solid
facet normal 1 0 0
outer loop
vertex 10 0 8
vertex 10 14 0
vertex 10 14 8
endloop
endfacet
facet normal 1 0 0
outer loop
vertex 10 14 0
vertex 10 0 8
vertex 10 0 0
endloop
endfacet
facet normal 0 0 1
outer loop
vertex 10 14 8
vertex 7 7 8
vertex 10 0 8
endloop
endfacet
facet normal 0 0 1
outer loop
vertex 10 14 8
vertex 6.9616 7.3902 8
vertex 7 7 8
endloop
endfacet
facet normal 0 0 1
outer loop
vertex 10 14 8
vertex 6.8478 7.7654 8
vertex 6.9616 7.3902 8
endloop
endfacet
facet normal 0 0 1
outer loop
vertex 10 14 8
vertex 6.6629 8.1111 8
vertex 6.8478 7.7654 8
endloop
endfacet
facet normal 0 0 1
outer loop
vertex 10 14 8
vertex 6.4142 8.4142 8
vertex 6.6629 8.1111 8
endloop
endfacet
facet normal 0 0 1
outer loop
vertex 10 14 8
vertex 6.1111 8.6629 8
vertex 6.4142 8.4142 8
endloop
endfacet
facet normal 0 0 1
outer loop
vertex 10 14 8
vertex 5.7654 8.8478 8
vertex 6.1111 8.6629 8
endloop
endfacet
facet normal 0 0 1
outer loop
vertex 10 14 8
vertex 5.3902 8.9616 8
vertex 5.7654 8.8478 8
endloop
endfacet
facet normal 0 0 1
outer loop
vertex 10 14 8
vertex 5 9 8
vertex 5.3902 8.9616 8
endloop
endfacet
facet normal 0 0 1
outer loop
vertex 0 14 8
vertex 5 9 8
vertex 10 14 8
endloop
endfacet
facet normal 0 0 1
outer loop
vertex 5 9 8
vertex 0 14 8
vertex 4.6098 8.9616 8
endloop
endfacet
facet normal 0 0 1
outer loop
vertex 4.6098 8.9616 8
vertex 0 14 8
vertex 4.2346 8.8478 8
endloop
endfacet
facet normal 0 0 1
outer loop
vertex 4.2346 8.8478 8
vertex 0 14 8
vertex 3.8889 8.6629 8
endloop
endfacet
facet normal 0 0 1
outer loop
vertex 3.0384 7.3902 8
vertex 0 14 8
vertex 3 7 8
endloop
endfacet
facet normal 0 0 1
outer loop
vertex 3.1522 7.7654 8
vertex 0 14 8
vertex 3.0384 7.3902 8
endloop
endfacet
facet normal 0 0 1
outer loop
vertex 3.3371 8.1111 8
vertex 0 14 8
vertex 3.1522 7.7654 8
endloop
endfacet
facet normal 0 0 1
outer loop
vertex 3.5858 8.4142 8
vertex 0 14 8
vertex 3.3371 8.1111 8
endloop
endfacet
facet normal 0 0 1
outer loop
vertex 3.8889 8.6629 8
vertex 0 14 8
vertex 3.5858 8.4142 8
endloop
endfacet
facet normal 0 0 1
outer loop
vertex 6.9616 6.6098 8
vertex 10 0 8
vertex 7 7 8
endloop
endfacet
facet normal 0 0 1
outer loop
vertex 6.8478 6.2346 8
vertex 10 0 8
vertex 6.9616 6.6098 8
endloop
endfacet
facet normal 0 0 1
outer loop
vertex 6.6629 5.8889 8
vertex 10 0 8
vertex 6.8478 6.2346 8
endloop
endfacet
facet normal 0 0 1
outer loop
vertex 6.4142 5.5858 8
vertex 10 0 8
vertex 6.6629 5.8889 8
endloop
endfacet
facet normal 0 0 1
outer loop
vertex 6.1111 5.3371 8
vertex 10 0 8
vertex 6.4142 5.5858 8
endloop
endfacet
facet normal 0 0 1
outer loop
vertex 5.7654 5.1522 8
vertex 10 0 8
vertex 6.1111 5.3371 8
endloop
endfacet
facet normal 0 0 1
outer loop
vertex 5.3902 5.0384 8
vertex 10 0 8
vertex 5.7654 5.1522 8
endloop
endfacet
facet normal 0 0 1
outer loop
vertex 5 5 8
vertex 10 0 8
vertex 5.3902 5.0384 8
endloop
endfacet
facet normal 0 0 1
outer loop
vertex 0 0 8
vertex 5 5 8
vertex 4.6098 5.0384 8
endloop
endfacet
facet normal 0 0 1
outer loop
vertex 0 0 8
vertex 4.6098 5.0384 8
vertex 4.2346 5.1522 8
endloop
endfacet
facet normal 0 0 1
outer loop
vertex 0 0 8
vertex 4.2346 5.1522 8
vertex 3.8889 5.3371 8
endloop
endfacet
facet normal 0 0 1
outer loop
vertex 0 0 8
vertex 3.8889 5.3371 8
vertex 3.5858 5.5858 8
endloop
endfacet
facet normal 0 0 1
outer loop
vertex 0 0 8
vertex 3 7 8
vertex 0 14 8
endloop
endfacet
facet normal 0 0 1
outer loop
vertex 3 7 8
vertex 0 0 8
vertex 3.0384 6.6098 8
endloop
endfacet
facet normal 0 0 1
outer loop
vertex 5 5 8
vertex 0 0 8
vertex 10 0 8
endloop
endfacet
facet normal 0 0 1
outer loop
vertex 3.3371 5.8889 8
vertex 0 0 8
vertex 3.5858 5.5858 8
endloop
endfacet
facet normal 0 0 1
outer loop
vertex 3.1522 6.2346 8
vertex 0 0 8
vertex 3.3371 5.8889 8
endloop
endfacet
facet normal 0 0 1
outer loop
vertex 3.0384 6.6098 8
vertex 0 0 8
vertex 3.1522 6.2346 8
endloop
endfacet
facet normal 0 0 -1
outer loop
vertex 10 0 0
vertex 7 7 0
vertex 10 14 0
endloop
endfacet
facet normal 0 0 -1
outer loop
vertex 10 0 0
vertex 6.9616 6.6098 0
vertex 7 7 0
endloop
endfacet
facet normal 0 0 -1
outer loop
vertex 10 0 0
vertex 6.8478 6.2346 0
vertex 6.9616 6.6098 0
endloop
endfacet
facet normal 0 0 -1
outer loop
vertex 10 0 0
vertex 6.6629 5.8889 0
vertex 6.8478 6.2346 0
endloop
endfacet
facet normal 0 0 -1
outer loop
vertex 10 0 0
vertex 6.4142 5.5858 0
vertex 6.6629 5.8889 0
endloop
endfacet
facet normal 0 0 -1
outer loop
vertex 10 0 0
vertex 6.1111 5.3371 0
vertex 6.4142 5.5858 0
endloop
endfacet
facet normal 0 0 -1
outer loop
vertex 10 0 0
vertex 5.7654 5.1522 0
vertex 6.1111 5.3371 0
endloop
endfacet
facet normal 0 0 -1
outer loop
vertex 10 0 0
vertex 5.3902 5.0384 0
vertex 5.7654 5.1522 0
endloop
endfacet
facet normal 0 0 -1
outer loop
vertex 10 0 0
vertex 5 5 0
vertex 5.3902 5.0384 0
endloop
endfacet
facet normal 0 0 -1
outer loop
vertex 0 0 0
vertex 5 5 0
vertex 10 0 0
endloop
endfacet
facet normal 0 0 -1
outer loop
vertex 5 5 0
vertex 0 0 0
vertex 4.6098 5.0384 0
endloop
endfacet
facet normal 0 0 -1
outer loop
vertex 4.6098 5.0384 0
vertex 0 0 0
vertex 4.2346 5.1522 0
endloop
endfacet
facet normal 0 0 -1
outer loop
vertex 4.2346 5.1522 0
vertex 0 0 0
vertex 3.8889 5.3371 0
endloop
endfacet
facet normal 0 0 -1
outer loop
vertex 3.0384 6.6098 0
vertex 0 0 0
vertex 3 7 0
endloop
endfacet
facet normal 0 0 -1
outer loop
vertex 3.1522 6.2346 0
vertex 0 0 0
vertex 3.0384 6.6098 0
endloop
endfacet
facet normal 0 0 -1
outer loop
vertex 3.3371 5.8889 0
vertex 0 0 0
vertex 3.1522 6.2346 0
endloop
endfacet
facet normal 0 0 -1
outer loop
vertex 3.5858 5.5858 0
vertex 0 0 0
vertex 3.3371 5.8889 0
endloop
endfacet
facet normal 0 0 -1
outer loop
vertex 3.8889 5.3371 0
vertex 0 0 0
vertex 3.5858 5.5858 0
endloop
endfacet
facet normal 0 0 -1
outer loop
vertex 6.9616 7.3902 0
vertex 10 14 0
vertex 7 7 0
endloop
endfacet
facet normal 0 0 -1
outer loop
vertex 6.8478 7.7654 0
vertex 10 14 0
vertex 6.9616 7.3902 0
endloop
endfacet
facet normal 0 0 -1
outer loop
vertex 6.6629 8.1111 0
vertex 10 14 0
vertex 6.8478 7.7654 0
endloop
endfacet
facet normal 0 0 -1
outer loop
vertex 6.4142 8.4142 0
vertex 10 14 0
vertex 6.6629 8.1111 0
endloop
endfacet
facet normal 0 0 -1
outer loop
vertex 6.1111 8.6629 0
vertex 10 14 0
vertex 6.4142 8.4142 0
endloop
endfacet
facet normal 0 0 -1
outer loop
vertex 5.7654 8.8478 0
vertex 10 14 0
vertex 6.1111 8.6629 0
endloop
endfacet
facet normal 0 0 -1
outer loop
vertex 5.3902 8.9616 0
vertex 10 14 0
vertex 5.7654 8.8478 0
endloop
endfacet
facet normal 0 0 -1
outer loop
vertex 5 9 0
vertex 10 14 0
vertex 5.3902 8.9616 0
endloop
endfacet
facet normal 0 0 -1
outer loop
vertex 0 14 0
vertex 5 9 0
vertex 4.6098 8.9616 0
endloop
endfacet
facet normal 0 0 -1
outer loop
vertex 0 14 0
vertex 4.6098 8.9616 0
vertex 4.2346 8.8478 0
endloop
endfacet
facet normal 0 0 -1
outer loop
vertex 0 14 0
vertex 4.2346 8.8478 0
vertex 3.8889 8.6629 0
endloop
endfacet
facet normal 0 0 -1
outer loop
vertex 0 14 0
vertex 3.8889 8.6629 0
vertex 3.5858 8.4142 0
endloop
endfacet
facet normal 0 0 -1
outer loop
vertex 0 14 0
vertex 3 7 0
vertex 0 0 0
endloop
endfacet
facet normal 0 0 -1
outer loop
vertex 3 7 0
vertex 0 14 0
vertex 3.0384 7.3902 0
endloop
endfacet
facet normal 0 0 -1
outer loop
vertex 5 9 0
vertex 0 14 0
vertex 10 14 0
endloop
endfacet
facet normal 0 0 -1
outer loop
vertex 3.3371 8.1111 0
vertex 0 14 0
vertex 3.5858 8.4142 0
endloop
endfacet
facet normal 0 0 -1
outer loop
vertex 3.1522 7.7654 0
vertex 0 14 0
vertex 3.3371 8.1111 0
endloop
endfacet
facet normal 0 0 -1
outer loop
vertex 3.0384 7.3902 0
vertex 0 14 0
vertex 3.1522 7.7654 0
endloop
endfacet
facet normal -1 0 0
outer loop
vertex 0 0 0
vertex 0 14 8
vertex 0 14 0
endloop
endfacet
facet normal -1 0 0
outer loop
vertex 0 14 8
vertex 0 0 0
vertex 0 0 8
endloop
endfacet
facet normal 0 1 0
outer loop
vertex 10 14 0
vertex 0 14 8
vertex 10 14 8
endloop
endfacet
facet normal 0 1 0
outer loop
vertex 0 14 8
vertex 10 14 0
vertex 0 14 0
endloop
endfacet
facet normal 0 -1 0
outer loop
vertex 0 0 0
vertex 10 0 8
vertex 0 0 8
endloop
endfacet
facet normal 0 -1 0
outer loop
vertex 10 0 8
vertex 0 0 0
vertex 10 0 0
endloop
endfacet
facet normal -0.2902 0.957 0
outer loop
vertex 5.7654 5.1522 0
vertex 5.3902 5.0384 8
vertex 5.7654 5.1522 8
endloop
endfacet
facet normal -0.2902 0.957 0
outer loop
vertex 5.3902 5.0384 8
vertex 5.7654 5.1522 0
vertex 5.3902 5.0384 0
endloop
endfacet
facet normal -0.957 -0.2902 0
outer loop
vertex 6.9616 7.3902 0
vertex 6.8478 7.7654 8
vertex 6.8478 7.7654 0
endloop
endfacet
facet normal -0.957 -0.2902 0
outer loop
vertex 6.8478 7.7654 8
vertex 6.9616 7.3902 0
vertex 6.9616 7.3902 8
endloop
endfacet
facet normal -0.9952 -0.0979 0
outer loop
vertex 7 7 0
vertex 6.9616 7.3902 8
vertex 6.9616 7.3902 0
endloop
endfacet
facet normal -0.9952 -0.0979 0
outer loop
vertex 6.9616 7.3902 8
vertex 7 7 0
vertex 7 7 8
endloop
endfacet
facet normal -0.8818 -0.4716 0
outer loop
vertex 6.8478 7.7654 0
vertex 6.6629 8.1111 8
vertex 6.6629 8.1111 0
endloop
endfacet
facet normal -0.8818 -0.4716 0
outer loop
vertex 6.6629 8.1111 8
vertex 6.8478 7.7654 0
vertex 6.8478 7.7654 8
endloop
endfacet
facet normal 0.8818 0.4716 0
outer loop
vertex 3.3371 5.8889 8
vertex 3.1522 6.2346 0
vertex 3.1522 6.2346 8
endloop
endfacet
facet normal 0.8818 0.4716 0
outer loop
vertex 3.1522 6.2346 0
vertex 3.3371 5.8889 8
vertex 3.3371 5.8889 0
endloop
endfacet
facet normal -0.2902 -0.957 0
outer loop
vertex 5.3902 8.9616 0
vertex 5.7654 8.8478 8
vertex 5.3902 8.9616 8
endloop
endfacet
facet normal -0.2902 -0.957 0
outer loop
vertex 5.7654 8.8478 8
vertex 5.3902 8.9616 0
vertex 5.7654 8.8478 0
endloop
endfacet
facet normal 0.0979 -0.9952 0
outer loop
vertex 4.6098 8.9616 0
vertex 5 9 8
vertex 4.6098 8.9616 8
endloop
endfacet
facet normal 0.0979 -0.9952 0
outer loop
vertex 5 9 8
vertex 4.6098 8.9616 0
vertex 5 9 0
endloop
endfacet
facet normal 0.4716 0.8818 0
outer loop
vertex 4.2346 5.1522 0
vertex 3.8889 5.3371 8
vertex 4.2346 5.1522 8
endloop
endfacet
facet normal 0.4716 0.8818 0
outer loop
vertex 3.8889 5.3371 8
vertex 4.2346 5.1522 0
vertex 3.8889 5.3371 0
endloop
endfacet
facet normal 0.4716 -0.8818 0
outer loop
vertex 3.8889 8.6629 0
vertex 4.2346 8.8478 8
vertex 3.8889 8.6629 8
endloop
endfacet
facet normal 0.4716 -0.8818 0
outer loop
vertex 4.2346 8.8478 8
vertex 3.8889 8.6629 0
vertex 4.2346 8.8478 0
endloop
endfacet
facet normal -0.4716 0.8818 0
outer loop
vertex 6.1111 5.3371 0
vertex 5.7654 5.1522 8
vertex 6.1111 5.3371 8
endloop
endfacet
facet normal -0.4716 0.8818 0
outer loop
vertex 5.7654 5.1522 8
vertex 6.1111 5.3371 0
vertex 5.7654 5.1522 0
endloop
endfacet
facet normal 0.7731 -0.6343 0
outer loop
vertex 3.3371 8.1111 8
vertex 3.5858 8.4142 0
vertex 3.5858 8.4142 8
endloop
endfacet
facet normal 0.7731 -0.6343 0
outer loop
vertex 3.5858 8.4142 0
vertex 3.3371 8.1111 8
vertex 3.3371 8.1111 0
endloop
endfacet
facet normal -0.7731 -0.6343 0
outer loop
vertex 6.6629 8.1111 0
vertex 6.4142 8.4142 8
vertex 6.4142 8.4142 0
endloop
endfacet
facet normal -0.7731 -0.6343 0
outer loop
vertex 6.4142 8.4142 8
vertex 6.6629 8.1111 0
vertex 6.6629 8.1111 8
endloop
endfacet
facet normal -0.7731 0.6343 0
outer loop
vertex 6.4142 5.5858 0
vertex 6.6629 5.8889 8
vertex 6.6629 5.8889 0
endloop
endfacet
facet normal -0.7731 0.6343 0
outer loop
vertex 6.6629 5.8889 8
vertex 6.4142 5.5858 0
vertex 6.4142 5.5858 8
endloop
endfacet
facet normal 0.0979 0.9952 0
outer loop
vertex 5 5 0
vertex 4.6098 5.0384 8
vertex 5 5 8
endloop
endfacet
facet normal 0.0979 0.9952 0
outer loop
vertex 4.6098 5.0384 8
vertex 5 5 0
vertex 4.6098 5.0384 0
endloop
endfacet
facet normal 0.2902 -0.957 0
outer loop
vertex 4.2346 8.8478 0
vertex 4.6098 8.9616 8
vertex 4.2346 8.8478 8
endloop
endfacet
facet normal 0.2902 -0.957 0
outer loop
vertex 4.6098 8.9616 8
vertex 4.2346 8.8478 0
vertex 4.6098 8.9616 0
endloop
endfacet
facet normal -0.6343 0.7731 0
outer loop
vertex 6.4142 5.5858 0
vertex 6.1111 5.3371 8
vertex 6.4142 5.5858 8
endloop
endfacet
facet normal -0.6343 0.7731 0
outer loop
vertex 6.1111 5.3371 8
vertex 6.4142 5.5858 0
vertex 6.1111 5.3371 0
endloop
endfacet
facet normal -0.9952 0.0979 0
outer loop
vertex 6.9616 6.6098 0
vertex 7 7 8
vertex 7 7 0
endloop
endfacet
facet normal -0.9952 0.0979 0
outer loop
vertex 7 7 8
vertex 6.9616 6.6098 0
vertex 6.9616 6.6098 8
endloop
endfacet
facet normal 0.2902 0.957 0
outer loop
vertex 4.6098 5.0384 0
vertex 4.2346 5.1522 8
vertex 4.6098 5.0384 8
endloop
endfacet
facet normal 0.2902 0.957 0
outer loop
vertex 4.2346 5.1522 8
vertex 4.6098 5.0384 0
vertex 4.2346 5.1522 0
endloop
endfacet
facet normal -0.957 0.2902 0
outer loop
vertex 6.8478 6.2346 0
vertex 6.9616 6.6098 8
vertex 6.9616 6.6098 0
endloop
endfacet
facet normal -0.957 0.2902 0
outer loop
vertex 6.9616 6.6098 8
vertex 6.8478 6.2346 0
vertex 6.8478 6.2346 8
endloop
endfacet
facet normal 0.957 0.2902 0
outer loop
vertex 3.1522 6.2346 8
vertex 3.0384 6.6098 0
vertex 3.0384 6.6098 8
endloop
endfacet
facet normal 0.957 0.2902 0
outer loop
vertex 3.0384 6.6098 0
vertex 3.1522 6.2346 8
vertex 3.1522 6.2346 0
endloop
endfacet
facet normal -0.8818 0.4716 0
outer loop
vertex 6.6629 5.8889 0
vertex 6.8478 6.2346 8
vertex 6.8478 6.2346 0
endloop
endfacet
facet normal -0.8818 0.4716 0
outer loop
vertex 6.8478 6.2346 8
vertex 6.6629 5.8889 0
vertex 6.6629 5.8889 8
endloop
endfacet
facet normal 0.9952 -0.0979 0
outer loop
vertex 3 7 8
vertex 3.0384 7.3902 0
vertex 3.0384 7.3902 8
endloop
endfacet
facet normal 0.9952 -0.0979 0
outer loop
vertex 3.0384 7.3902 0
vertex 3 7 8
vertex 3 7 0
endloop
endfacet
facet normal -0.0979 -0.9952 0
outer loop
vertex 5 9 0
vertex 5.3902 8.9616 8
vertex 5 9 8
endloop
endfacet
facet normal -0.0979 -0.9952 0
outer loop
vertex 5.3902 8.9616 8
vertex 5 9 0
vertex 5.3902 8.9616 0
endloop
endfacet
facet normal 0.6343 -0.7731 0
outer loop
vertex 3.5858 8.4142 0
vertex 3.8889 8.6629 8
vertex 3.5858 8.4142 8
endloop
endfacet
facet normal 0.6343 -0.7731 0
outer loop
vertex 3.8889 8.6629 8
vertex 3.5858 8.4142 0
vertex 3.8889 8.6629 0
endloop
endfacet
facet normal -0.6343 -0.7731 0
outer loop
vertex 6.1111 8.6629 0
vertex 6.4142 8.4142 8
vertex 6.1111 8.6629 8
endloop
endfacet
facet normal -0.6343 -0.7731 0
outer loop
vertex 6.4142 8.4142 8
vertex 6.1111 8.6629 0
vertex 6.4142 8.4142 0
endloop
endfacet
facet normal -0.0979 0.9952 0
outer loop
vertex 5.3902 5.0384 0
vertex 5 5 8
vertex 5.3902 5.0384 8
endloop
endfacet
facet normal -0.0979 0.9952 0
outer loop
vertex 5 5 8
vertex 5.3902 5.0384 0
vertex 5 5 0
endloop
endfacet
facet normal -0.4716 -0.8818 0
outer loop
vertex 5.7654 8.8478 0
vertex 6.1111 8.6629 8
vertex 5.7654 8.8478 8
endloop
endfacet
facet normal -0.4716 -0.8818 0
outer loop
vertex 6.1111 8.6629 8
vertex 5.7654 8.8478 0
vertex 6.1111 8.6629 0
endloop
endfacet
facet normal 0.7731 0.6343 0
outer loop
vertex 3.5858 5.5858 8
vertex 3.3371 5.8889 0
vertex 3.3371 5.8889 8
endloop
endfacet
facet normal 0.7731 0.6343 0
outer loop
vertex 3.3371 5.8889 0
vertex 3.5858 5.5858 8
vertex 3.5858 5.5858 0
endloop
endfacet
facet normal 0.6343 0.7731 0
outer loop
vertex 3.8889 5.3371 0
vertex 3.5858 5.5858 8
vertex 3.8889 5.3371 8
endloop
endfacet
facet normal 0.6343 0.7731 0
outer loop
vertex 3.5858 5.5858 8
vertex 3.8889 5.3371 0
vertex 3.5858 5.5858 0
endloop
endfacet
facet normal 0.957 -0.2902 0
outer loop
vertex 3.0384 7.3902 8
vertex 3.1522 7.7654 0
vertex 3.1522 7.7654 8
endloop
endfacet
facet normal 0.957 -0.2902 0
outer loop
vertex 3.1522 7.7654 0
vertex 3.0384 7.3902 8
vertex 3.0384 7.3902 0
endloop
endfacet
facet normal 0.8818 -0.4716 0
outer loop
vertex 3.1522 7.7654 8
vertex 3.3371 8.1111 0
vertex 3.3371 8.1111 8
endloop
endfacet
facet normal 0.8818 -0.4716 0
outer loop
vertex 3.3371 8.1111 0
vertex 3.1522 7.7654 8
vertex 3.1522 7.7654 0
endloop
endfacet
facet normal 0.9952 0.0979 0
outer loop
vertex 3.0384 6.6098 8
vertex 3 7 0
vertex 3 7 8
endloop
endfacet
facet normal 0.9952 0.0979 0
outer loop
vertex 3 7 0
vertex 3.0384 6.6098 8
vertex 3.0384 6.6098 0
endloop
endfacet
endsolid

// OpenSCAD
$fn = 32;

// ----------------------------------------------------------------------
// Micro pad: drilled pad, 5-20 mm class
// ----------------------------------------------------------------------

// --- parameters (mm) ---
pad_l = 10;               // pad length, X
pad_w = 14;               // pad width, Y
pad_t = 8;                // pad thickness, Z
hole_d = 4;               // through hole diameter

difference() {
  cube([pad_l, pad_w, pad_t]);
  translate([pad_l / 2, pad_w / 2, -1])
    cylinder(h = pad_t + 2, d = hole_d);
}
